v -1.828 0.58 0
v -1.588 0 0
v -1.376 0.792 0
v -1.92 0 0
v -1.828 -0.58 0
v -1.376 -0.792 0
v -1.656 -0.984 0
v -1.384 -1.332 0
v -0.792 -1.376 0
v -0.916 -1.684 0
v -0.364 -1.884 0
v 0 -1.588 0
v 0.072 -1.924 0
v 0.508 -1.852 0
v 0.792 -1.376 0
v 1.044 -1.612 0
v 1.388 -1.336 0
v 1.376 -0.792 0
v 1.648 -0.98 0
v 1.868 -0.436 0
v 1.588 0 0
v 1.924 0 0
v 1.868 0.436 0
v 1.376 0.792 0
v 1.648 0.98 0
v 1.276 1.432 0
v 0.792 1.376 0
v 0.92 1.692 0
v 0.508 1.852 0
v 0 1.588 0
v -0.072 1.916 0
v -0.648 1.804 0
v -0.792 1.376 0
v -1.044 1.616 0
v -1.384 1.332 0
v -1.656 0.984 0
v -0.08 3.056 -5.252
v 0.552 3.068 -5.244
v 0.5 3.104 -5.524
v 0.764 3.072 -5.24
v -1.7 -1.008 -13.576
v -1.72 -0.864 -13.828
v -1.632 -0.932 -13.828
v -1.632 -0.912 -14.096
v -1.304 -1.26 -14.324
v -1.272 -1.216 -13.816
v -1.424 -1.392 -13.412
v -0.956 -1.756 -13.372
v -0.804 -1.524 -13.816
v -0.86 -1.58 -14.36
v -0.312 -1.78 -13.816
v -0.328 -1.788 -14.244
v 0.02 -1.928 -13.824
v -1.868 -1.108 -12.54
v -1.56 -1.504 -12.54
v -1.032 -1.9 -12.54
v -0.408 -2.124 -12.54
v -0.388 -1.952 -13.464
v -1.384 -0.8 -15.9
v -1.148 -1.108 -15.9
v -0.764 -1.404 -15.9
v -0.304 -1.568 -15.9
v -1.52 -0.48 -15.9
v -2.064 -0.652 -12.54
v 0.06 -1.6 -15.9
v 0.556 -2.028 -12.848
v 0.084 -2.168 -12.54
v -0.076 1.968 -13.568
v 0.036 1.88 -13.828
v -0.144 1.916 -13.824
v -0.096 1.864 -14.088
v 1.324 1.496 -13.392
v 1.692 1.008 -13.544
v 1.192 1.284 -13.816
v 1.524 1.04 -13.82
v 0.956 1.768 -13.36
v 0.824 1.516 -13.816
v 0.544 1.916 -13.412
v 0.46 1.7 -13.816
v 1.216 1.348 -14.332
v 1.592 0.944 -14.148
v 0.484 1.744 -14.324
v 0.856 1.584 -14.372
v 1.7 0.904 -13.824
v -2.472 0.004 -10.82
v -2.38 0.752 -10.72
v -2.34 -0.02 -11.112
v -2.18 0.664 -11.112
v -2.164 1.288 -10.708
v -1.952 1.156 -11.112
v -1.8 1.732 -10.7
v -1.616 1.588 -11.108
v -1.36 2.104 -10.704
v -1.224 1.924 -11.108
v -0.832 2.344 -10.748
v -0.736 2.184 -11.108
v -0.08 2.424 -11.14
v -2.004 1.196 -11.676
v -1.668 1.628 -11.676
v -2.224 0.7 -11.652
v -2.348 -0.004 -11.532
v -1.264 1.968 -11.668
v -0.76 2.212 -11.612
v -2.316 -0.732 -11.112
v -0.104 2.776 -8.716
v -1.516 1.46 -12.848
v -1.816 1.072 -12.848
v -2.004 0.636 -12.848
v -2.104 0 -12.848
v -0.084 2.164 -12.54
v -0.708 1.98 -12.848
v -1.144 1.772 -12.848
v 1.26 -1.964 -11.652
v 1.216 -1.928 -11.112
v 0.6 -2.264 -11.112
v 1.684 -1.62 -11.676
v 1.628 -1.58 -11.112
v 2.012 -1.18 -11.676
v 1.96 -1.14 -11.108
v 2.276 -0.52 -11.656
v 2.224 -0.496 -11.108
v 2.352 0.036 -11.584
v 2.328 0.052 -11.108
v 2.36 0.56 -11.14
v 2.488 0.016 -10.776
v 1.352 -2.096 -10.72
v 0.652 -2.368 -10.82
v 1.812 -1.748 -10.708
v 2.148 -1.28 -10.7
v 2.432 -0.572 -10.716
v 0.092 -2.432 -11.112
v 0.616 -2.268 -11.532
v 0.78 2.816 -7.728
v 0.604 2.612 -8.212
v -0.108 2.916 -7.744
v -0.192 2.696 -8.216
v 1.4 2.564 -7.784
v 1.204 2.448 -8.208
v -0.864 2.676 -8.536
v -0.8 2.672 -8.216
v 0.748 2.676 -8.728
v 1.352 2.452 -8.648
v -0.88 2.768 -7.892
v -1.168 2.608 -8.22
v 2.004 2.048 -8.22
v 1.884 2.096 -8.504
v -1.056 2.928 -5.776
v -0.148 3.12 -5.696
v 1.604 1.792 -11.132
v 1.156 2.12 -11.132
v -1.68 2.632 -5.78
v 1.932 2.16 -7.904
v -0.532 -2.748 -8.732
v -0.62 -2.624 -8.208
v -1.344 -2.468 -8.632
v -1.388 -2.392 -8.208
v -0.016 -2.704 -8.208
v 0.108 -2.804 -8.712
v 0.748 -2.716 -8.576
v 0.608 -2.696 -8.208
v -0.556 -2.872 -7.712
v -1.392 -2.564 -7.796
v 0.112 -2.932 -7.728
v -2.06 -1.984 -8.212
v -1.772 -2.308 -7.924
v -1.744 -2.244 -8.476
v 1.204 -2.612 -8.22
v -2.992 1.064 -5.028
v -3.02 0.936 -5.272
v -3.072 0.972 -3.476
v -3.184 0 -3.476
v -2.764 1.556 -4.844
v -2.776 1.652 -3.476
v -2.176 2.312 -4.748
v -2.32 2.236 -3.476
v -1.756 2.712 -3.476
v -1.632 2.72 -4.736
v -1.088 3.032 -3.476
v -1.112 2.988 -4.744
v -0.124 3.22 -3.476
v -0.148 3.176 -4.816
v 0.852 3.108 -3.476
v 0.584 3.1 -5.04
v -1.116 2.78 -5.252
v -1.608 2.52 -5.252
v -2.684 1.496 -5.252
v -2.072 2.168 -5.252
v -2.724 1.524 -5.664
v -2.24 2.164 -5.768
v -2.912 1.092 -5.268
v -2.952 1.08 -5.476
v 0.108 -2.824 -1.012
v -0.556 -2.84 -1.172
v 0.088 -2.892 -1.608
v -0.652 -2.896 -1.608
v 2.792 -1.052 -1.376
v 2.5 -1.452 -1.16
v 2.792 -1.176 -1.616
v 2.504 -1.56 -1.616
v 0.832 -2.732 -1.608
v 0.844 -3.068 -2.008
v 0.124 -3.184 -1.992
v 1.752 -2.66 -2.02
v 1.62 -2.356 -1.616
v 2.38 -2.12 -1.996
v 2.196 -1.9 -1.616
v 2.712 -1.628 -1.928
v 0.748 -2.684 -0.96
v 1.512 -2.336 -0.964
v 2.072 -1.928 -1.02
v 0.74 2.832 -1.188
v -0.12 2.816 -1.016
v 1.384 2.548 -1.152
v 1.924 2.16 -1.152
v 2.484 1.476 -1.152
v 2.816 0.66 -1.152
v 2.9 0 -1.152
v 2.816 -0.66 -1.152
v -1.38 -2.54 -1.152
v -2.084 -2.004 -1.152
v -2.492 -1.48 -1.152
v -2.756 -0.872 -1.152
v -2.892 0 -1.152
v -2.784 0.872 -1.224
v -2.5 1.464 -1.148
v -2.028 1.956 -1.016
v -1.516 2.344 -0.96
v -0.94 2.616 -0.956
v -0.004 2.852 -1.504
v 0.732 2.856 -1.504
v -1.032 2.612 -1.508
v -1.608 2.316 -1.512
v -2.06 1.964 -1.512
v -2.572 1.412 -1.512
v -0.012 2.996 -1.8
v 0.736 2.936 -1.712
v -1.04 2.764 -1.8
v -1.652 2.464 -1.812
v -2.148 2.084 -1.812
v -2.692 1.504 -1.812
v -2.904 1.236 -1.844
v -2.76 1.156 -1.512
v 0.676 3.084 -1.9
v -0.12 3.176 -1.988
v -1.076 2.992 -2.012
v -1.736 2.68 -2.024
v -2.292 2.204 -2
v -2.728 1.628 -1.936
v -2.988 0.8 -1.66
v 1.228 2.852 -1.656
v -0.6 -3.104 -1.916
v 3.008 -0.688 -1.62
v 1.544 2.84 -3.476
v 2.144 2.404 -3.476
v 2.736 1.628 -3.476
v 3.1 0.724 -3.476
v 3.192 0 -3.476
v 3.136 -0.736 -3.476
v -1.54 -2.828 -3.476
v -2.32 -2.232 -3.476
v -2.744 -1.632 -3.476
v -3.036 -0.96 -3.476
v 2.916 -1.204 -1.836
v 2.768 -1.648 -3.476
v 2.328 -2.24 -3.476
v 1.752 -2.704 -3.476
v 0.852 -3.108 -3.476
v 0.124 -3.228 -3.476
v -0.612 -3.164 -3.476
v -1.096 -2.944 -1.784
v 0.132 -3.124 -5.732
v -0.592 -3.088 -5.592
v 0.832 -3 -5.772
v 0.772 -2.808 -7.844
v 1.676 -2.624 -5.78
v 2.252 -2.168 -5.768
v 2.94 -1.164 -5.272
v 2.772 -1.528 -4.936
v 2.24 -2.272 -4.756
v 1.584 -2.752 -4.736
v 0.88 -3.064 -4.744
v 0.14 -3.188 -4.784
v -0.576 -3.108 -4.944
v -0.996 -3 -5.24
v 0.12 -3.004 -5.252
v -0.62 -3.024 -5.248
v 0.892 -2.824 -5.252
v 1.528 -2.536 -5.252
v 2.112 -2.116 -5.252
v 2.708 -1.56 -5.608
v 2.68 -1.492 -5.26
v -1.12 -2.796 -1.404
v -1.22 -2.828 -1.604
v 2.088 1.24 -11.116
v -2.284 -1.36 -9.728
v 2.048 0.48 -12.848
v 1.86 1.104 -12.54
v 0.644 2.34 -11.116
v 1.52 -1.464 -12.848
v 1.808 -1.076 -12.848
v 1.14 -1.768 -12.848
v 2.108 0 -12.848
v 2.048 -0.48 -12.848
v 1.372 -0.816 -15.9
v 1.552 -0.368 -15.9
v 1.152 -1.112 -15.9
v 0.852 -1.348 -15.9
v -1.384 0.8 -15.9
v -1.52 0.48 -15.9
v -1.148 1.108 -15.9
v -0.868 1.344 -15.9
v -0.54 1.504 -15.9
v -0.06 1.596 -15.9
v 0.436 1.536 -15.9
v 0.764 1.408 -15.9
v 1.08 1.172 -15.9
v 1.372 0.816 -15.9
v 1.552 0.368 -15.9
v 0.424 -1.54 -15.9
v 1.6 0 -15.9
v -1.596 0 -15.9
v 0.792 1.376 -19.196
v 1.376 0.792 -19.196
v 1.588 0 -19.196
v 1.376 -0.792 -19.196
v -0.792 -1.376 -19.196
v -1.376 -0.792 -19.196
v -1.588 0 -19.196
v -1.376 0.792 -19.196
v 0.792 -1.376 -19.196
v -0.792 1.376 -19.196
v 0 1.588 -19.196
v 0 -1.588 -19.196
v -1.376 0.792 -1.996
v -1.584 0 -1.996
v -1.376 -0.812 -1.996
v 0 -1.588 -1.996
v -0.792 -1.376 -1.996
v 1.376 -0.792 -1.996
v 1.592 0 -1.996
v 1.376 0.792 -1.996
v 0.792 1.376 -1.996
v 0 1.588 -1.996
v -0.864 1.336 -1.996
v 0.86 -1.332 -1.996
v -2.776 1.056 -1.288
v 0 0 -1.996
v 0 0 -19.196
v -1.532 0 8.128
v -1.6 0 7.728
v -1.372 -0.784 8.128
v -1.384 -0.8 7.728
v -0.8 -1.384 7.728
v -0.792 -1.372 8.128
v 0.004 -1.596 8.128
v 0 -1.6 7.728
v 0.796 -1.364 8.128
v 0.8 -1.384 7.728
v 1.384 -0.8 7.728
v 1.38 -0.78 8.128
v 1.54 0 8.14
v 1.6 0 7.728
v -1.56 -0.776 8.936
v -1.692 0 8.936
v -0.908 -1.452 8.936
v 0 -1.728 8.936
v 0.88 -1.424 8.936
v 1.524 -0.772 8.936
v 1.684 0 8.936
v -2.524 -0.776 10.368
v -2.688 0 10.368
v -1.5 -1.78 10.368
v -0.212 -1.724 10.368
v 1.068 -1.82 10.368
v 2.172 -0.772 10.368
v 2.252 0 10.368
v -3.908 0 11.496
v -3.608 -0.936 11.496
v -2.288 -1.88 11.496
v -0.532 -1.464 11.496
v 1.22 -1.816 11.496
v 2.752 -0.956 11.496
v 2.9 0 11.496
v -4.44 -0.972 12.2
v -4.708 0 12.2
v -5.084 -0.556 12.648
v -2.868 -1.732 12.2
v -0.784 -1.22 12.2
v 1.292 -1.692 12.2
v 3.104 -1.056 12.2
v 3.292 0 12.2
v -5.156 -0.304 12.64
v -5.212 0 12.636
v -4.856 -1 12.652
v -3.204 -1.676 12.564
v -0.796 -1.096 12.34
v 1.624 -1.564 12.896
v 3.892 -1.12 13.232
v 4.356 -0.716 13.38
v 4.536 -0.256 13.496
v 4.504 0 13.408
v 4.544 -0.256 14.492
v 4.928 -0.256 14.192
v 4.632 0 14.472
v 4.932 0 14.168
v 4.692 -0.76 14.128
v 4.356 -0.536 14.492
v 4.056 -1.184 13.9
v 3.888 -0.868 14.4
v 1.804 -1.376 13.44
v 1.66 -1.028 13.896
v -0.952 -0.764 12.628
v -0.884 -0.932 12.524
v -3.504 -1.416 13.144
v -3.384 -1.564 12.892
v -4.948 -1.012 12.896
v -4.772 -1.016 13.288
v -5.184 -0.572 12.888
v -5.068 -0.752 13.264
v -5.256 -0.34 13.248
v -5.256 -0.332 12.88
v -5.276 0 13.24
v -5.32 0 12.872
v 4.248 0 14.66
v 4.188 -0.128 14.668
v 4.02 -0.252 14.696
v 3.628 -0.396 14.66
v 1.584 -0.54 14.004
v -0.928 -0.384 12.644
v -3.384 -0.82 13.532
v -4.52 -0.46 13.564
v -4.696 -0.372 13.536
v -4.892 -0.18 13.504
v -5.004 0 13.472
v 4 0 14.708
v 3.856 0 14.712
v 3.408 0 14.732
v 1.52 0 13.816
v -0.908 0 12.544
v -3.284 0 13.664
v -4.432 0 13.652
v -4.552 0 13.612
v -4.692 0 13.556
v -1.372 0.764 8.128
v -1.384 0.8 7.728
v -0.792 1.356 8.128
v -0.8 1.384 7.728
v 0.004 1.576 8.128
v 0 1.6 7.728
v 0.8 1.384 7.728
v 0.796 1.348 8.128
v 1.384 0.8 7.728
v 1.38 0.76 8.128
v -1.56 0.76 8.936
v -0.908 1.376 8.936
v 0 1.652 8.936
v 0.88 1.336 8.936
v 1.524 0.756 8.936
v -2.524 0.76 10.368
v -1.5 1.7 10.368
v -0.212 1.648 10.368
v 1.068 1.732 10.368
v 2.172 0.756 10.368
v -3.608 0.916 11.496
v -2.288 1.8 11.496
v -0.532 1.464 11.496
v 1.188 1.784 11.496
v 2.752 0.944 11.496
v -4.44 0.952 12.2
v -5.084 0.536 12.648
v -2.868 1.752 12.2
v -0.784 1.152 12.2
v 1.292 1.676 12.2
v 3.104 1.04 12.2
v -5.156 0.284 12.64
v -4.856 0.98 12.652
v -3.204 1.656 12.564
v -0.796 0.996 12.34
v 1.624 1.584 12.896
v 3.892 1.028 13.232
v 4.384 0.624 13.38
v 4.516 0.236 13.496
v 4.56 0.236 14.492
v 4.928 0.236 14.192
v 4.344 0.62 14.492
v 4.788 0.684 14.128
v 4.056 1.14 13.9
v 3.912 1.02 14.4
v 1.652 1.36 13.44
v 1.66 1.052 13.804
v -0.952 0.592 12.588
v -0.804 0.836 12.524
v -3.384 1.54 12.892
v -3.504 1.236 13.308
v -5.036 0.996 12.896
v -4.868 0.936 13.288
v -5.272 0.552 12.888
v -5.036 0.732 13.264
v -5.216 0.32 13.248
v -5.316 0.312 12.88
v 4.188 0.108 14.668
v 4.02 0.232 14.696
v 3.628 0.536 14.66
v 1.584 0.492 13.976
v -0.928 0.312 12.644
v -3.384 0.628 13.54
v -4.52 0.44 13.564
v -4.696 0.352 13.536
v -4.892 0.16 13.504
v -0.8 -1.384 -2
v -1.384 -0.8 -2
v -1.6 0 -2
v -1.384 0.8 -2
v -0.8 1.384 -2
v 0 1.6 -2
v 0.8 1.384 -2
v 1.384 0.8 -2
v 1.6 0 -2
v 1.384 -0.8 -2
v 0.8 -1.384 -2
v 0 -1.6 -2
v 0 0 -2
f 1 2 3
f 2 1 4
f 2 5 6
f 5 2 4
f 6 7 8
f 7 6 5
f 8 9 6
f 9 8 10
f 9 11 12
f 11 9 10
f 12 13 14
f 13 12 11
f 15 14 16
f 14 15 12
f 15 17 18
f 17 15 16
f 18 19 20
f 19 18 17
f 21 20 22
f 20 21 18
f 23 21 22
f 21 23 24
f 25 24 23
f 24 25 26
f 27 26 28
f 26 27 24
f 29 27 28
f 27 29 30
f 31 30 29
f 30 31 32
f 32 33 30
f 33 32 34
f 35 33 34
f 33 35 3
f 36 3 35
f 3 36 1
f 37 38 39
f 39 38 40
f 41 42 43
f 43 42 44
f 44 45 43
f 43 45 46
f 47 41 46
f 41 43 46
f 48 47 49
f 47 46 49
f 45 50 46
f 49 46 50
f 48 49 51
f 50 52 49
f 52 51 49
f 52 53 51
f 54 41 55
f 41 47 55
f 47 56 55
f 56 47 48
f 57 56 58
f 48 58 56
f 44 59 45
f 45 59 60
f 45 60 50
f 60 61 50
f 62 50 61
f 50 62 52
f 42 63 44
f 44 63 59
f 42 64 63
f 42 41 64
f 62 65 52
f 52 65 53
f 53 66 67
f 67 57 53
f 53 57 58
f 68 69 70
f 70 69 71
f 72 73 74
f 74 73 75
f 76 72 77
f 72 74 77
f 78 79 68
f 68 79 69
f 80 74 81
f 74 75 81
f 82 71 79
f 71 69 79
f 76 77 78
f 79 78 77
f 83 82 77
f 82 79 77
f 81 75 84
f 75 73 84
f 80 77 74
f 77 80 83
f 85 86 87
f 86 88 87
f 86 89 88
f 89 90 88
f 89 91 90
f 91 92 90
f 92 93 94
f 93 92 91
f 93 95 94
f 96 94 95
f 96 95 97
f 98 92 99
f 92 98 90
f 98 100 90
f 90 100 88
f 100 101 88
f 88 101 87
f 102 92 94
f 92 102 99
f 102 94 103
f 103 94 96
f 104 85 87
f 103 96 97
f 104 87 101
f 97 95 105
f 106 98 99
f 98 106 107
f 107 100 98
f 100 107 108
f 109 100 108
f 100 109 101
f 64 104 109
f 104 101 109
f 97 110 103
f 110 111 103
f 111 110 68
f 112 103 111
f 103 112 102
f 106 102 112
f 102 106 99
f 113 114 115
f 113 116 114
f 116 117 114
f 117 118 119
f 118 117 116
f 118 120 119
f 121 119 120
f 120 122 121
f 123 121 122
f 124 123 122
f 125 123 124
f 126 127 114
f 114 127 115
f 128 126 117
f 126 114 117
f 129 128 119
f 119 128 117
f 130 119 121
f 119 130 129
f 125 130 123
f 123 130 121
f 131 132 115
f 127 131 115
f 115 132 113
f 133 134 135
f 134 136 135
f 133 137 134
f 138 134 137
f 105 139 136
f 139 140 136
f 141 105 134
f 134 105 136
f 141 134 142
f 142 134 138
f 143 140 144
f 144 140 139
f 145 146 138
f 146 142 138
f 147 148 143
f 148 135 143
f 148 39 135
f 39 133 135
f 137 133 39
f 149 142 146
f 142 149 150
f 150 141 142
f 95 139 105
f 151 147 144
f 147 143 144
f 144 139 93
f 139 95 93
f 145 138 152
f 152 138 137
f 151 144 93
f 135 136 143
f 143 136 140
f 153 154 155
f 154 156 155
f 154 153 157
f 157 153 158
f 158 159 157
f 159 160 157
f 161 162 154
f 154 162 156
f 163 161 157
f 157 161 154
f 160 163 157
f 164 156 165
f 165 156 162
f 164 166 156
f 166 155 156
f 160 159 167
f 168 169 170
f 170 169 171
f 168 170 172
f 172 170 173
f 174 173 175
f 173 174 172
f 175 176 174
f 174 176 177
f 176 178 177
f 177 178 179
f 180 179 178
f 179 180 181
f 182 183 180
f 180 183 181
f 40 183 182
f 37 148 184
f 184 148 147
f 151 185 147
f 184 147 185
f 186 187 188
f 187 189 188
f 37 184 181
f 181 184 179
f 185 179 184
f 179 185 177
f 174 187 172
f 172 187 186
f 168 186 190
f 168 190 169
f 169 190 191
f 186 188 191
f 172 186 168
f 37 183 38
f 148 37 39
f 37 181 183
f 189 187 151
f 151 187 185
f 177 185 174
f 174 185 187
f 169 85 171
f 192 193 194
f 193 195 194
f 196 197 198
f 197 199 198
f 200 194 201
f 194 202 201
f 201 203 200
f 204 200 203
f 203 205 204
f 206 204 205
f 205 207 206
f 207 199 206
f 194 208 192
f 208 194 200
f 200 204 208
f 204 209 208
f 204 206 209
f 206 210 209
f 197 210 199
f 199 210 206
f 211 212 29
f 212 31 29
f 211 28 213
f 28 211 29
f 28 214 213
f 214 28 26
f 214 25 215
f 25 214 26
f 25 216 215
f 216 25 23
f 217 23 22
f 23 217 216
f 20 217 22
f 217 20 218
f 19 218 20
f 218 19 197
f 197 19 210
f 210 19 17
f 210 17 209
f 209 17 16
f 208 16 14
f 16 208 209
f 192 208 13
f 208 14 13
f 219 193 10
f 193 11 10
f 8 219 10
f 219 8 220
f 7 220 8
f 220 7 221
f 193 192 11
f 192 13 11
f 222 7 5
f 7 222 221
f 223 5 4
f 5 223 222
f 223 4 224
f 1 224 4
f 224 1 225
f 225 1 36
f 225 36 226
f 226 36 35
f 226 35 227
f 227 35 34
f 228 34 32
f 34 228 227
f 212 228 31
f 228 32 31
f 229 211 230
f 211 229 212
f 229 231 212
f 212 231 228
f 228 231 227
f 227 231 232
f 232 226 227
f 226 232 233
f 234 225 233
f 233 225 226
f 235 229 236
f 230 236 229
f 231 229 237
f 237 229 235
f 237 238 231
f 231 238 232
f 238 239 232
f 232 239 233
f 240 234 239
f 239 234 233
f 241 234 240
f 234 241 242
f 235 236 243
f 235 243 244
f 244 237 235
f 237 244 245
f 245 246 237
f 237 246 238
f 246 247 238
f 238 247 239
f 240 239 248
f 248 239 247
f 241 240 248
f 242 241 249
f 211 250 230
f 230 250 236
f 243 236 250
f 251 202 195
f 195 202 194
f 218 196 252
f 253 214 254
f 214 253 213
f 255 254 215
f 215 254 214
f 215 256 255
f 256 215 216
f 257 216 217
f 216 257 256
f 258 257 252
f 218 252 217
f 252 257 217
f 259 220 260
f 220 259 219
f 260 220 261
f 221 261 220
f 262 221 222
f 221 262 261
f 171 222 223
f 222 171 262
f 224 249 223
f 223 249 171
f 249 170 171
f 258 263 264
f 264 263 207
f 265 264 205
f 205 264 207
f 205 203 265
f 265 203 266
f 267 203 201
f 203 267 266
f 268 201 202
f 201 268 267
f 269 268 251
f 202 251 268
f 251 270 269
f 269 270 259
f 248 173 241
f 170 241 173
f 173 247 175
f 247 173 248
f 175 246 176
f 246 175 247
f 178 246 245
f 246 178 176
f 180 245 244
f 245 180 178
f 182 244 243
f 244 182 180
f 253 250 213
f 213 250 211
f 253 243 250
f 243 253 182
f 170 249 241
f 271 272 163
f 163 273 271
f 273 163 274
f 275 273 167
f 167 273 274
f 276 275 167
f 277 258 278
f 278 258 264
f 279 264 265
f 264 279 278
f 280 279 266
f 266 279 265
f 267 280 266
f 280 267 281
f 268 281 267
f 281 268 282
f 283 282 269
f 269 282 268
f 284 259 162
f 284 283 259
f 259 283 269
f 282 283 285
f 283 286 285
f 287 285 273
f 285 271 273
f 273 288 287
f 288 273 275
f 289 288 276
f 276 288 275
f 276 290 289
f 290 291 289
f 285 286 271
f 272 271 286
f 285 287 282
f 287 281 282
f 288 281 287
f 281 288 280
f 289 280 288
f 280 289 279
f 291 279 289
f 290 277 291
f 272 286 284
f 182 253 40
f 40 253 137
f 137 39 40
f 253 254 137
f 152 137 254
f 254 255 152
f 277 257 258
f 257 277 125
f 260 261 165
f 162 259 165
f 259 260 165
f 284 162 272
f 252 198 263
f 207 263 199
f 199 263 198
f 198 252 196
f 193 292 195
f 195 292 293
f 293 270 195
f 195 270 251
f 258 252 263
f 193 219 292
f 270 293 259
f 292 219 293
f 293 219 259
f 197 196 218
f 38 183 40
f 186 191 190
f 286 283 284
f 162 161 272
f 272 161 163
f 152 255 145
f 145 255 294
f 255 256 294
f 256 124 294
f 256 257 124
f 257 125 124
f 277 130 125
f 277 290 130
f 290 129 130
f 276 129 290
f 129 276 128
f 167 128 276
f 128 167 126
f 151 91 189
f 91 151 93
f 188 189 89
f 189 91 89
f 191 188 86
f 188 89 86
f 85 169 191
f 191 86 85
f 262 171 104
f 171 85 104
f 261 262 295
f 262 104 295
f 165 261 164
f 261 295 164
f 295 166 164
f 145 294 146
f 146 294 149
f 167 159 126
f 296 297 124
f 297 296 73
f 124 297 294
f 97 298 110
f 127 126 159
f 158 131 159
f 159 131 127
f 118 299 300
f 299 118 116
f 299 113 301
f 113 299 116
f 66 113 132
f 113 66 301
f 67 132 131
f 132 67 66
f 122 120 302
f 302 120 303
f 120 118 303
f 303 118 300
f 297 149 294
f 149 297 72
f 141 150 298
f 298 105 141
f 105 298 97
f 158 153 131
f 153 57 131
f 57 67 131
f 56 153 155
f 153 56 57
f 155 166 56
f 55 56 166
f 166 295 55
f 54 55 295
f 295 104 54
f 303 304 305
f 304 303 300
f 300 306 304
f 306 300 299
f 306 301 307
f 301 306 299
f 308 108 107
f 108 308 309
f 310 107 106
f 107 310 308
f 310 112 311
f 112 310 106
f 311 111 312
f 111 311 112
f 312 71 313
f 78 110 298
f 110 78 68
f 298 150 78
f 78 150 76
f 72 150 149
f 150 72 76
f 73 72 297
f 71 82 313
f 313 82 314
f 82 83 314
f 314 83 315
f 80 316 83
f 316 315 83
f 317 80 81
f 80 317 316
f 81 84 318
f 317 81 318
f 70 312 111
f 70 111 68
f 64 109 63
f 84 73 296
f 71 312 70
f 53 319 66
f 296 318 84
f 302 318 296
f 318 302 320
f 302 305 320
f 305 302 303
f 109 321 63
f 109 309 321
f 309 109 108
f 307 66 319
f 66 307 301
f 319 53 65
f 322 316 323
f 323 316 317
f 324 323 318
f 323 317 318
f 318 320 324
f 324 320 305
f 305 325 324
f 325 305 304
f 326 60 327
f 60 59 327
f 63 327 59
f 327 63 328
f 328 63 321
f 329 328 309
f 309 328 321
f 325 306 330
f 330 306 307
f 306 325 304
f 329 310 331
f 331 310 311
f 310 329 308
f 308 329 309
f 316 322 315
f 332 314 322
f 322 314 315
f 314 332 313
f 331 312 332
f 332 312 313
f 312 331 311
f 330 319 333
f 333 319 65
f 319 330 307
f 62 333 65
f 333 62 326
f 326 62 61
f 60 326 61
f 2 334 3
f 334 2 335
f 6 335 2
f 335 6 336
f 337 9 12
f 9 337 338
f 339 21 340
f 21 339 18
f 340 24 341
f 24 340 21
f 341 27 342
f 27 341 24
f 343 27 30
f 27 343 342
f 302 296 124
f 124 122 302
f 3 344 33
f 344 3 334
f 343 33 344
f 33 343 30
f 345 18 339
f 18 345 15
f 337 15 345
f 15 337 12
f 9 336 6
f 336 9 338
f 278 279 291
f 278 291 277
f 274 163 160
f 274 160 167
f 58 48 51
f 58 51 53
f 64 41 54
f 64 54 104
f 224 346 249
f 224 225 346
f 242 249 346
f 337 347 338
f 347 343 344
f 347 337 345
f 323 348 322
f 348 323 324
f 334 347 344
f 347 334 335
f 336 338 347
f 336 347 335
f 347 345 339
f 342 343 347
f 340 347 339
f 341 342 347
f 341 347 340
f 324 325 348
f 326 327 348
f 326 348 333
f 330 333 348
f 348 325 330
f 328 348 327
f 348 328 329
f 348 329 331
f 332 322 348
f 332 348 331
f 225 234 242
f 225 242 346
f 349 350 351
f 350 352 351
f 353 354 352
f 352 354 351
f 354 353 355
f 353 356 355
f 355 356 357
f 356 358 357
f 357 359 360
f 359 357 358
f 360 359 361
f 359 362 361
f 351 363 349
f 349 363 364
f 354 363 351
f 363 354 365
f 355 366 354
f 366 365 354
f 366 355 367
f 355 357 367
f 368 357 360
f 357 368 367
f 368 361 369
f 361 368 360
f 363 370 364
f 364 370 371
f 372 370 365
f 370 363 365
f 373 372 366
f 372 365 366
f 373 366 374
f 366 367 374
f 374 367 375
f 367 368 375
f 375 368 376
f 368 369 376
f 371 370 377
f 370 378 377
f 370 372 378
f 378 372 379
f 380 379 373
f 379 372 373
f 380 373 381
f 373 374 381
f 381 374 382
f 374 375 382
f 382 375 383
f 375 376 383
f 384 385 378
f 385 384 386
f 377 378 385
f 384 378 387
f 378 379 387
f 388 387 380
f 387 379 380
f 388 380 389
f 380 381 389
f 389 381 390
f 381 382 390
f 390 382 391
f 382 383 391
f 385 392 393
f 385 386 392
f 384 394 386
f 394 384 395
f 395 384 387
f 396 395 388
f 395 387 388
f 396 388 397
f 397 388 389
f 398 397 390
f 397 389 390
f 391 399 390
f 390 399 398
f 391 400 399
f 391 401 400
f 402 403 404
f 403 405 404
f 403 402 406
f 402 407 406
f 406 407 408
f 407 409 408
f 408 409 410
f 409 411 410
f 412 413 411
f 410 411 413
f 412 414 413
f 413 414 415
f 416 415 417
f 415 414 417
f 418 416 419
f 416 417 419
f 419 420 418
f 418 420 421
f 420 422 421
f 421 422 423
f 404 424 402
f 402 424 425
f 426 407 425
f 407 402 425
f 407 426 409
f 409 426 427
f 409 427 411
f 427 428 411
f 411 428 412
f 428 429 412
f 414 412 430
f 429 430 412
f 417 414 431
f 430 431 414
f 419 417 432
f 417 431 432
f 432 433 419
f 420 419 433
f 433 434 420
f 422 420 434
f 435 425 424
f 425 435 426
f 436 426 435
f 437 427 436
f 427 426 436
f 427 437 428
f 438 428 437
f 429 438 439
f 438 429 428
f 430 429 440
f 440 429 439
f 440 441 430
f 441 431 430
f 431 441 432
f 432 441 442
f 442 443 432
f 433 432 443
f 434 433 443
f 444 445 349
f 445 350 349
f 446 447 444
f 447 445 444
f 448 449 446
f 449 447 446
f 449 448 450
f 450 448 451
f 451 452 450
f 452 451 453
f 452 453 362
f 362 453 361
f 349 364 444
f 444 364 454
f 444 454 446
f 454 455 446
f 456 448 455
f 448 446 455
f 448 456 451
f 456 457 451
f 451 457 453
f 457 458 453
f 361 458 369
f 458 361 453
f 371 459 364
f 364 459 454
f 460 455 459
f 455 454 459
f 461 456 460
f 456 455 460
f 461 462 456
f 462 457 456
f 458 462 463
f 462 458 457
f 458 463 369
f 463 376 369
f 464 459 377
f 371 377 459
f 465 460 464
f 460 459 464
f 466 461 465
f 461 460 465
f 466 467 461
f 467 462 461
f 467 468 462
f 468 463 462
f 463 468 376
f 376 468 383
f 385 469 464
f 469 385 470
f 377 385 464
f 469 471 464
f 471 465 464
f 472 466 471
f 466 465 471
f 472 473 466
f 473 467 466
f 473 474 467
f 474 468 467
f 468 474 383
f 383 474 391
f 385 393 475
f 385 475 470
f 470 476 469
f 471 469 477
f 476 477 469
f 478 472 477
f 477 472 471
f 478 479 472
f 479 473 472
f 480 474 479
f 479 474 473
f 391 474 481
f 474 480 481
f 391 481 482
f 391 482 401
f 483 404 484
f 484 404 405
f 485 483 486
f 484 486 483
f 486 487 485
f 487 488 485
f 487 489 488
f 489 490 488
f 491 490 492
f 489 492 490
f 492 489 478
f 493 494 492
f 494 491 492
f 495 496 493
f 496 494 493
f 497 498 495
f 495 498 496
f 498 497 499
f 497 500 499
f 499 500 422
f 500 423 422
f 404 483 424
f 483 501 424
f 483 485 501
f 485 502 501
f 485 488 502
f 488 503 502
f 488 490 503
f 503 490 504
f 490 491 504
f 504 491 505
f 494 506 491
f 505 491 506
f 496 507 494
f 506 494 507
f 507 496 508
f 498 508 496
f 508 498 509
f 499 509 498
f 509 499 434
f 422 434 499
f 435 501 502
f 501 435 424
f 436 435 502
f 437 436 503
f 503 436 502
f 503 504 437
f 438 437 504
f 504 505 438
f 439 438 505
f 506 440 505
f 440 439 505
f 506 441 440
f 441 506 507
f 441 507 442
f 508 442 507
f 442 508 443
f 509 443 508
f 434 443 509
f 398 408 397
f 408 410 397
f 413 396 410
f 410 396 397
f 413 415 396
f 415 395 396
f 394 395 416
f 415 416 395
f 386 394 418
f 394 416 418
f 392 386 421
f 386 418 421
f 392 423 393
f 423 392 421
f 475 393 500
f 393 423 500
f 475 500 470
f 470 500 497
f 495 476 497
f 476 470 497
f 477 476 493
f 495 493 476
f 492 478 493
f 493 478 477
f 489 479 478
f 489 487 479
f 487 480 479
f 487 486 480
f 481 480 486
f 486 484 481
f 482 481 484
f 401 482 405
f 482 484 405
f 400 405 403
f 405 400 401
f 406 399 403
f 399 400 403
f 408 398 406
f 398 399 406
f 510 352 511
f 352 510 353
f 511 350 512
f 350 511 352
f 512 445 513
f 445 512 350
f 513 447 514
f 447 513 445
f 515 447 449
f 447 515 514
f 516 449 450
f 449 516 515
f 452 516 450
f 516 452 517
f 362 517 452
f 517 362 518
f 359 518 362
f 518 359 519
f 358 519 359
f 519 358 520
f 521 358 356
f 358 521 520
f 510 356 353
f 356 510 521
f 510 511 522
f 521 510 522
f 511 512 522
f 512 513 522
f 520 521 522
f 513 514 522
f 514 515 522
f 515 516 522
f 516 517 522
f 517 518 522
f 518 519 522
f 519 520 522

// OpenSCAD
use <../lib.scad>
use <33172.scad>
use <33183.scad>
function ldraw_lib__33172c03() = [
// 0 Minifig Food Carrot with Lime Leaves (Complete)
// 0 Name: 33172c03.dat
// 0 Author: Vincent Messenet [Cheenzo]
// 0 !LDRAW_ORG Shortcut UPDATE 2025-08
// 0 !LICENSE Licensed under CC BY 4.0 : see CAreadme.txt
// 
// 0 BFC CERTIFY CCW
  [0,"BFC","CERTIFY"],
  [0,"BFC","CCW"],
// 
// 0 !CATEGORY Minifig Accessory
// 
// 0 !HISTORY 2025-08-31 [OrionP] Official Update 2025-08
// 
// 1 16 0 0 0 1 0 0 0 1 0 0 0 1 33172.dat
  [1,16,0,0,0,1,0,0,0,1,0,0,0,1, ldraw_lib__33172()],
// 1 27 0 5 0 1 0 0 0 1 0 0 0 1 33183.dat
  [1,27,0,5,0,1,0,0,0,1,0,0,0,1, ldraw_lib__33183()],
// 
];
module ldraw_lib__33172c03(step=0, col=false, unit=2/5, alt=false, line=0.2, solid=!$preview)
    makepoly(ldraw_lib__33172c03(), step=step, col=col, unit=unit, alt=alt, line=line, solid=solid);
ldraw_lib__33172c03(line=0.2);
